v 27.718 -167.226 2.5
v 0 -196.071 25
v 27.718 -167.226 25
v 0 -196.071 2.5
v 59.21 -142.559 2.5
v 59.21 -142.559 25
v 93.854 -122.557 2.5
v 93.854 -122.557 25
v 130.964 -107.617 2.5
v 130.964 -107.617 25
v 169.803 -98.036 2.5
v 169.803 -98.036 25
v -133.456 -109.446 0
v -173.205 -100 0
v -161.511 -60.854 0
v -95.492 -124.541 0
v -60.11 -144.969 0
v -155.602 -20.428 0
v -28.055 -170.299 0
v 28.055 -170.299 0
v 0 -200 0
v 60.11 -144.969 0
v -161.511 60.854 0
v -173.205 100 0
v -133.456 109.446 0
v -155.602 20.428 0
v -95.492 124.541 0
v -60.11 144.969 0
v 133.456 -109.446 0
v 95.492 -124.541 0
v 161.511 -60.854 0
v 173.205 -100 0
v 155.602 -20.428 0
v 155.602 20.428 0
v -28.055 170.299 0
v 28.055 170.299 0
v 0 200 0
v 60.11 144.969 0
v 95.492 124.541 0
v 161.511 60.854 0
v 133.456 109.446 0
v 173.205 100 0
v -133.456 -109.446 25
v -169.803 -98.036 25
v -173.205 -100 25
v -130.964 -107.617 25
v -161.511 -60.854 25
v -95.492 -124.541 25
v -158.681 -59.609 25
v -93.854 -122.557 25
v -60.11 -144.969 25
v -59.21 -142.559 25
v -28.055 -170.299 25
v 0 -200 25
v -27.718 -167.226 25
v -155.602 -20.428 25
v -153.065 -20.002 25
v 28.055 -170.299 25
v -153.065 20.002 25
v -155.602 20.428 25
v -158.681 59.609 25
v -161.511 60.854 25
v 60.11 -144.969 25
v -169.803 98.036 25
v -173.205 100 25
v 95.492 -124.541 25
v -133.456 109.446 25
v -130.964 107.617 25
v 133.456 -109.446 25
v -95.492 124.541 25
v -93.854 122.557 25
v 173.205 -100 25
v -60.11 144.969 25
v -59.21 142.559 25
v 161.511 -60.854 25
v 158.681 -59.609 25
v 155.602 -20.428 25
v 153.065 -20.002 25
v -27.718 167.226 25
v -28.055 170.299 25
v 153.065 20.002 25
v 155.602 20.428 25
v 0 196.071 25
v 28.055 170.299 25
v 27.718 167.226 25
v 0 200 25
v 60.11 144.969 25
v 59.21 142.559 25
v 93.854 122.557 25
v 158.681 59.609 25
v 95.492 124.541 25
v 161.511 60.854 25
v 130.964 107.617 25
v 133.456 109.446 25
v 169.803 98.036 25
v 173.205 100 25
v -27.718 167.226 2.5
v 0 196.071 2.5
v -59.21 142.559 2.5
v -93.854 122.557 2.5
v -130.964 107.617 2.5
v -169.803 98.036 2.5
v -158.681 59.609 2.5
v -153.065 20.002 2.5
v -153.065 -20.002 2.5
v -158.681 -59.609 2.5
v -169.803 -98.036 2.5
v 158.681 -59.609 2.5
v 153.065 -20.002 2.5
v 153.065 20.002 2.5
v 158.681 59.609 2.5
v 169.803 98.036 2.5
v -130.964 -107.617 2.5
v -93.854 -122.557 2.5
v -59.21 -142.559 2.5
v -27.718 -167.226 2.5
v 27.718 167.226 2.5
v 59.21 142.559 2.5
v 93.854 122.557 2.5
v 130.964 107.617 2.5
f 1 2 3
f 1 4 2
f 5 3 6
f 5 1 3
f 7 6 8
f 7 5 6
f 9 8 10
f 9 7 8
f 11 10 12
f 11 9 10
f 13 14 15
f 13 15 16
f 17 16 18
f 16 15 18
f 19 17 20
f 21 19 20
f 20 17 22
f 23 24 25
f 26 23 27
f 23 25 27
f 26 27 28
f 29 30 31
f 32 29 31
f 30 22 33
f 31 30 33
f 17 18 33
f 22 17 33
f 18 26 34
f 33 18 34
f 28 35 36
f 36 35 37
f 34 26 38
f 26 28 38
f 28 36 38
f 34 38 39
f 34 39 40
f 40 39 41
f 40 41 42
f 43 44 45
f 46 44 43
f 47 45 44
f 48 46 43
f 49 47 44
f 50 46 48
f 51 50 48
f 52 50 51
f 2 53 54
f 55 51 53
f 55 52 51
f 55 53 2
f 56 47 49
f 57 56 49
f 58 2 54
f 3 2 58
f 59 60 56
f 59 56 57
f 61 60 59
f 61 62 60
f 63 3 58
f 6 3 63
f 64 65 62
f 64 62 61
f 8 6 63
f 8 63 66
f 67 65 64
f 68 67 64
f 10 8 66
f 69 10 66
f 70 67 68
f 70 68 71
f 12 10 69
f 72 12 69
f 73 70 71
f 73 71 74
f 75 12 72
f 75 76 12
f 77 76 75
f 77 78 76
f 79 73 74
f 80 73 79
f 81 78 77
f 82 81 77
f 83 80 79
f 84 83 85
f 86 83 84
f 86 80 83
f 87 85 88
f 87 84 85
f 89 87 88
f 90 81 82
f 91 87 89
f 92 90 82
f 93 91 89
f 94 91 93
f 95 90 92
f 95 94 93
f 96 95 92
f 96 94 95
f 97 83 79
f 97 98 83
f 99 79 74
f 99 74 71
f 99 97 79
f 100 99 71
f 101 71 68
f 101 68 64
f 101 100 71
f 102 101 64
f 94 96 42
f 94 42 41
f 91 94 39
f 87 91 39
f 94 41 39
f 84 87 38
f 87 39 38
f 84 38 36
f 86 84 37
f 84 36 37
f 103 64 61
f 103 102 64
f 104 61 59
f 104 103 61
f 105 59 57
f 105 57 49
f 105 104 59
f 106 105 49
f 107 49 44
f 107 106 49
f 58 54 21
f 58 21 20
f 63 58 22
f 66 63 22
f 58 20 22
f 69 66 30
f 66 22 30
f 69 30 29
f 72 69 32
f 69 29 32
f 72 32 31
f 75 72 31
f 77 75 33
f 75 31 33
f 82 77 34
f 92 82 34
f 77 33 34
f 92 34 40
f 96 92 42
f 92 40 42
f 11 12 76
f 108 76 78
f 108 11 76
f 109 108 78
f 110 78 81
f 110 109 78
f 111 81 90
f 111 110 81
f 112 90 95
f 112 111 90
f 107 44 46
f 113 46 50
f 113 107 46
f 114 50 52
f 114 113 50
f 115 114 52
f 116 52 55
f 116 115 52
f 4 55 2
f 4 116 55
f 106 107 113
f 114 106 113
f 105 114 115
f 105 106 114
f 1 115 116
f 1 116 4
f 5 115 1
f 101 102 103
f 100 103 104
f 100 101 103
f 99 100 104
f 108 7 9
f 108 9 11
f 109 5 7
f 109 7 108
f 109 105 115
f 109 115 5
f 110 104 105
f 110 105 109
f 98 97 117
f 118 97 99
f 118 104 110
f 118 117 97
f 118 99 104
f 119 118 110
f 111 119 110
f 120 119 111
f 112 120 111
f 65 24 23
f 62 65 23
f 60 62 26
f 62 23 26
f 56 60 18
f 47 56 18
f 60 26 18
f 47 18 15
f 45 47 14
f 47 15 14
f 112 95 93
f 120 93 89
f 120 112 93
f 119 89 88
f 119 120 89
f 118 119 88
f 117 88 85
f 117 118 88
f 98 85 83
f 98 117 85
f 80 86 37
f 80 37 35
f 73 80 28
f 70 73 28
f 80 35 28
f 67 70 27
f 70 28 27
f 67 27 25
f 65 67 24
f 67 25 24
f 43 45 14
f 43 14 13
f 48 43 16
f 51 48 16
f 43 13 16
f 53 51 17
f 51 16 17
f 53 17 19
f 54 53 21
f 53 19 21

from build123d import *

# Parameters (mm, degrees)
F1_DEPTH = 25
F2_T     = -2.5


with BuildPart() as f1:
    # F0 (on Top) → F1 (new body)
    with BuildSketch(Plane.XY):
        with BuildLine():
            ThreePointArc((-173.205081, 100), (-154.860158, 0), (-173.205081, -100))
            ThreePointArc((-173.205081, -100), (-77.430079, -134.112831), (0, -200))
            ThreePointArc((0, -200), (77.430079, -134.112831), (173.205081, -100))
            ThreePointArc((173.205081, -100), (154.860158, 0), (173.205081, 100))
            ThreePointArc((173.205081, 100), (77.430079, 134.112831), (0, 200))
            ThreePointArc((0, 200), (-77.430079, 134.112831), (-173.205081, 100))
        make_face()
    extrude(amount=F1_DEPTH)

    # F2
    f2_openings = [f1.faces().sort_by_distance(p)[0] for p in [
        (0, 0, 25),
    ]]
    offset(amount=F2_T, openings=f2_openings)


solid = f1.part
